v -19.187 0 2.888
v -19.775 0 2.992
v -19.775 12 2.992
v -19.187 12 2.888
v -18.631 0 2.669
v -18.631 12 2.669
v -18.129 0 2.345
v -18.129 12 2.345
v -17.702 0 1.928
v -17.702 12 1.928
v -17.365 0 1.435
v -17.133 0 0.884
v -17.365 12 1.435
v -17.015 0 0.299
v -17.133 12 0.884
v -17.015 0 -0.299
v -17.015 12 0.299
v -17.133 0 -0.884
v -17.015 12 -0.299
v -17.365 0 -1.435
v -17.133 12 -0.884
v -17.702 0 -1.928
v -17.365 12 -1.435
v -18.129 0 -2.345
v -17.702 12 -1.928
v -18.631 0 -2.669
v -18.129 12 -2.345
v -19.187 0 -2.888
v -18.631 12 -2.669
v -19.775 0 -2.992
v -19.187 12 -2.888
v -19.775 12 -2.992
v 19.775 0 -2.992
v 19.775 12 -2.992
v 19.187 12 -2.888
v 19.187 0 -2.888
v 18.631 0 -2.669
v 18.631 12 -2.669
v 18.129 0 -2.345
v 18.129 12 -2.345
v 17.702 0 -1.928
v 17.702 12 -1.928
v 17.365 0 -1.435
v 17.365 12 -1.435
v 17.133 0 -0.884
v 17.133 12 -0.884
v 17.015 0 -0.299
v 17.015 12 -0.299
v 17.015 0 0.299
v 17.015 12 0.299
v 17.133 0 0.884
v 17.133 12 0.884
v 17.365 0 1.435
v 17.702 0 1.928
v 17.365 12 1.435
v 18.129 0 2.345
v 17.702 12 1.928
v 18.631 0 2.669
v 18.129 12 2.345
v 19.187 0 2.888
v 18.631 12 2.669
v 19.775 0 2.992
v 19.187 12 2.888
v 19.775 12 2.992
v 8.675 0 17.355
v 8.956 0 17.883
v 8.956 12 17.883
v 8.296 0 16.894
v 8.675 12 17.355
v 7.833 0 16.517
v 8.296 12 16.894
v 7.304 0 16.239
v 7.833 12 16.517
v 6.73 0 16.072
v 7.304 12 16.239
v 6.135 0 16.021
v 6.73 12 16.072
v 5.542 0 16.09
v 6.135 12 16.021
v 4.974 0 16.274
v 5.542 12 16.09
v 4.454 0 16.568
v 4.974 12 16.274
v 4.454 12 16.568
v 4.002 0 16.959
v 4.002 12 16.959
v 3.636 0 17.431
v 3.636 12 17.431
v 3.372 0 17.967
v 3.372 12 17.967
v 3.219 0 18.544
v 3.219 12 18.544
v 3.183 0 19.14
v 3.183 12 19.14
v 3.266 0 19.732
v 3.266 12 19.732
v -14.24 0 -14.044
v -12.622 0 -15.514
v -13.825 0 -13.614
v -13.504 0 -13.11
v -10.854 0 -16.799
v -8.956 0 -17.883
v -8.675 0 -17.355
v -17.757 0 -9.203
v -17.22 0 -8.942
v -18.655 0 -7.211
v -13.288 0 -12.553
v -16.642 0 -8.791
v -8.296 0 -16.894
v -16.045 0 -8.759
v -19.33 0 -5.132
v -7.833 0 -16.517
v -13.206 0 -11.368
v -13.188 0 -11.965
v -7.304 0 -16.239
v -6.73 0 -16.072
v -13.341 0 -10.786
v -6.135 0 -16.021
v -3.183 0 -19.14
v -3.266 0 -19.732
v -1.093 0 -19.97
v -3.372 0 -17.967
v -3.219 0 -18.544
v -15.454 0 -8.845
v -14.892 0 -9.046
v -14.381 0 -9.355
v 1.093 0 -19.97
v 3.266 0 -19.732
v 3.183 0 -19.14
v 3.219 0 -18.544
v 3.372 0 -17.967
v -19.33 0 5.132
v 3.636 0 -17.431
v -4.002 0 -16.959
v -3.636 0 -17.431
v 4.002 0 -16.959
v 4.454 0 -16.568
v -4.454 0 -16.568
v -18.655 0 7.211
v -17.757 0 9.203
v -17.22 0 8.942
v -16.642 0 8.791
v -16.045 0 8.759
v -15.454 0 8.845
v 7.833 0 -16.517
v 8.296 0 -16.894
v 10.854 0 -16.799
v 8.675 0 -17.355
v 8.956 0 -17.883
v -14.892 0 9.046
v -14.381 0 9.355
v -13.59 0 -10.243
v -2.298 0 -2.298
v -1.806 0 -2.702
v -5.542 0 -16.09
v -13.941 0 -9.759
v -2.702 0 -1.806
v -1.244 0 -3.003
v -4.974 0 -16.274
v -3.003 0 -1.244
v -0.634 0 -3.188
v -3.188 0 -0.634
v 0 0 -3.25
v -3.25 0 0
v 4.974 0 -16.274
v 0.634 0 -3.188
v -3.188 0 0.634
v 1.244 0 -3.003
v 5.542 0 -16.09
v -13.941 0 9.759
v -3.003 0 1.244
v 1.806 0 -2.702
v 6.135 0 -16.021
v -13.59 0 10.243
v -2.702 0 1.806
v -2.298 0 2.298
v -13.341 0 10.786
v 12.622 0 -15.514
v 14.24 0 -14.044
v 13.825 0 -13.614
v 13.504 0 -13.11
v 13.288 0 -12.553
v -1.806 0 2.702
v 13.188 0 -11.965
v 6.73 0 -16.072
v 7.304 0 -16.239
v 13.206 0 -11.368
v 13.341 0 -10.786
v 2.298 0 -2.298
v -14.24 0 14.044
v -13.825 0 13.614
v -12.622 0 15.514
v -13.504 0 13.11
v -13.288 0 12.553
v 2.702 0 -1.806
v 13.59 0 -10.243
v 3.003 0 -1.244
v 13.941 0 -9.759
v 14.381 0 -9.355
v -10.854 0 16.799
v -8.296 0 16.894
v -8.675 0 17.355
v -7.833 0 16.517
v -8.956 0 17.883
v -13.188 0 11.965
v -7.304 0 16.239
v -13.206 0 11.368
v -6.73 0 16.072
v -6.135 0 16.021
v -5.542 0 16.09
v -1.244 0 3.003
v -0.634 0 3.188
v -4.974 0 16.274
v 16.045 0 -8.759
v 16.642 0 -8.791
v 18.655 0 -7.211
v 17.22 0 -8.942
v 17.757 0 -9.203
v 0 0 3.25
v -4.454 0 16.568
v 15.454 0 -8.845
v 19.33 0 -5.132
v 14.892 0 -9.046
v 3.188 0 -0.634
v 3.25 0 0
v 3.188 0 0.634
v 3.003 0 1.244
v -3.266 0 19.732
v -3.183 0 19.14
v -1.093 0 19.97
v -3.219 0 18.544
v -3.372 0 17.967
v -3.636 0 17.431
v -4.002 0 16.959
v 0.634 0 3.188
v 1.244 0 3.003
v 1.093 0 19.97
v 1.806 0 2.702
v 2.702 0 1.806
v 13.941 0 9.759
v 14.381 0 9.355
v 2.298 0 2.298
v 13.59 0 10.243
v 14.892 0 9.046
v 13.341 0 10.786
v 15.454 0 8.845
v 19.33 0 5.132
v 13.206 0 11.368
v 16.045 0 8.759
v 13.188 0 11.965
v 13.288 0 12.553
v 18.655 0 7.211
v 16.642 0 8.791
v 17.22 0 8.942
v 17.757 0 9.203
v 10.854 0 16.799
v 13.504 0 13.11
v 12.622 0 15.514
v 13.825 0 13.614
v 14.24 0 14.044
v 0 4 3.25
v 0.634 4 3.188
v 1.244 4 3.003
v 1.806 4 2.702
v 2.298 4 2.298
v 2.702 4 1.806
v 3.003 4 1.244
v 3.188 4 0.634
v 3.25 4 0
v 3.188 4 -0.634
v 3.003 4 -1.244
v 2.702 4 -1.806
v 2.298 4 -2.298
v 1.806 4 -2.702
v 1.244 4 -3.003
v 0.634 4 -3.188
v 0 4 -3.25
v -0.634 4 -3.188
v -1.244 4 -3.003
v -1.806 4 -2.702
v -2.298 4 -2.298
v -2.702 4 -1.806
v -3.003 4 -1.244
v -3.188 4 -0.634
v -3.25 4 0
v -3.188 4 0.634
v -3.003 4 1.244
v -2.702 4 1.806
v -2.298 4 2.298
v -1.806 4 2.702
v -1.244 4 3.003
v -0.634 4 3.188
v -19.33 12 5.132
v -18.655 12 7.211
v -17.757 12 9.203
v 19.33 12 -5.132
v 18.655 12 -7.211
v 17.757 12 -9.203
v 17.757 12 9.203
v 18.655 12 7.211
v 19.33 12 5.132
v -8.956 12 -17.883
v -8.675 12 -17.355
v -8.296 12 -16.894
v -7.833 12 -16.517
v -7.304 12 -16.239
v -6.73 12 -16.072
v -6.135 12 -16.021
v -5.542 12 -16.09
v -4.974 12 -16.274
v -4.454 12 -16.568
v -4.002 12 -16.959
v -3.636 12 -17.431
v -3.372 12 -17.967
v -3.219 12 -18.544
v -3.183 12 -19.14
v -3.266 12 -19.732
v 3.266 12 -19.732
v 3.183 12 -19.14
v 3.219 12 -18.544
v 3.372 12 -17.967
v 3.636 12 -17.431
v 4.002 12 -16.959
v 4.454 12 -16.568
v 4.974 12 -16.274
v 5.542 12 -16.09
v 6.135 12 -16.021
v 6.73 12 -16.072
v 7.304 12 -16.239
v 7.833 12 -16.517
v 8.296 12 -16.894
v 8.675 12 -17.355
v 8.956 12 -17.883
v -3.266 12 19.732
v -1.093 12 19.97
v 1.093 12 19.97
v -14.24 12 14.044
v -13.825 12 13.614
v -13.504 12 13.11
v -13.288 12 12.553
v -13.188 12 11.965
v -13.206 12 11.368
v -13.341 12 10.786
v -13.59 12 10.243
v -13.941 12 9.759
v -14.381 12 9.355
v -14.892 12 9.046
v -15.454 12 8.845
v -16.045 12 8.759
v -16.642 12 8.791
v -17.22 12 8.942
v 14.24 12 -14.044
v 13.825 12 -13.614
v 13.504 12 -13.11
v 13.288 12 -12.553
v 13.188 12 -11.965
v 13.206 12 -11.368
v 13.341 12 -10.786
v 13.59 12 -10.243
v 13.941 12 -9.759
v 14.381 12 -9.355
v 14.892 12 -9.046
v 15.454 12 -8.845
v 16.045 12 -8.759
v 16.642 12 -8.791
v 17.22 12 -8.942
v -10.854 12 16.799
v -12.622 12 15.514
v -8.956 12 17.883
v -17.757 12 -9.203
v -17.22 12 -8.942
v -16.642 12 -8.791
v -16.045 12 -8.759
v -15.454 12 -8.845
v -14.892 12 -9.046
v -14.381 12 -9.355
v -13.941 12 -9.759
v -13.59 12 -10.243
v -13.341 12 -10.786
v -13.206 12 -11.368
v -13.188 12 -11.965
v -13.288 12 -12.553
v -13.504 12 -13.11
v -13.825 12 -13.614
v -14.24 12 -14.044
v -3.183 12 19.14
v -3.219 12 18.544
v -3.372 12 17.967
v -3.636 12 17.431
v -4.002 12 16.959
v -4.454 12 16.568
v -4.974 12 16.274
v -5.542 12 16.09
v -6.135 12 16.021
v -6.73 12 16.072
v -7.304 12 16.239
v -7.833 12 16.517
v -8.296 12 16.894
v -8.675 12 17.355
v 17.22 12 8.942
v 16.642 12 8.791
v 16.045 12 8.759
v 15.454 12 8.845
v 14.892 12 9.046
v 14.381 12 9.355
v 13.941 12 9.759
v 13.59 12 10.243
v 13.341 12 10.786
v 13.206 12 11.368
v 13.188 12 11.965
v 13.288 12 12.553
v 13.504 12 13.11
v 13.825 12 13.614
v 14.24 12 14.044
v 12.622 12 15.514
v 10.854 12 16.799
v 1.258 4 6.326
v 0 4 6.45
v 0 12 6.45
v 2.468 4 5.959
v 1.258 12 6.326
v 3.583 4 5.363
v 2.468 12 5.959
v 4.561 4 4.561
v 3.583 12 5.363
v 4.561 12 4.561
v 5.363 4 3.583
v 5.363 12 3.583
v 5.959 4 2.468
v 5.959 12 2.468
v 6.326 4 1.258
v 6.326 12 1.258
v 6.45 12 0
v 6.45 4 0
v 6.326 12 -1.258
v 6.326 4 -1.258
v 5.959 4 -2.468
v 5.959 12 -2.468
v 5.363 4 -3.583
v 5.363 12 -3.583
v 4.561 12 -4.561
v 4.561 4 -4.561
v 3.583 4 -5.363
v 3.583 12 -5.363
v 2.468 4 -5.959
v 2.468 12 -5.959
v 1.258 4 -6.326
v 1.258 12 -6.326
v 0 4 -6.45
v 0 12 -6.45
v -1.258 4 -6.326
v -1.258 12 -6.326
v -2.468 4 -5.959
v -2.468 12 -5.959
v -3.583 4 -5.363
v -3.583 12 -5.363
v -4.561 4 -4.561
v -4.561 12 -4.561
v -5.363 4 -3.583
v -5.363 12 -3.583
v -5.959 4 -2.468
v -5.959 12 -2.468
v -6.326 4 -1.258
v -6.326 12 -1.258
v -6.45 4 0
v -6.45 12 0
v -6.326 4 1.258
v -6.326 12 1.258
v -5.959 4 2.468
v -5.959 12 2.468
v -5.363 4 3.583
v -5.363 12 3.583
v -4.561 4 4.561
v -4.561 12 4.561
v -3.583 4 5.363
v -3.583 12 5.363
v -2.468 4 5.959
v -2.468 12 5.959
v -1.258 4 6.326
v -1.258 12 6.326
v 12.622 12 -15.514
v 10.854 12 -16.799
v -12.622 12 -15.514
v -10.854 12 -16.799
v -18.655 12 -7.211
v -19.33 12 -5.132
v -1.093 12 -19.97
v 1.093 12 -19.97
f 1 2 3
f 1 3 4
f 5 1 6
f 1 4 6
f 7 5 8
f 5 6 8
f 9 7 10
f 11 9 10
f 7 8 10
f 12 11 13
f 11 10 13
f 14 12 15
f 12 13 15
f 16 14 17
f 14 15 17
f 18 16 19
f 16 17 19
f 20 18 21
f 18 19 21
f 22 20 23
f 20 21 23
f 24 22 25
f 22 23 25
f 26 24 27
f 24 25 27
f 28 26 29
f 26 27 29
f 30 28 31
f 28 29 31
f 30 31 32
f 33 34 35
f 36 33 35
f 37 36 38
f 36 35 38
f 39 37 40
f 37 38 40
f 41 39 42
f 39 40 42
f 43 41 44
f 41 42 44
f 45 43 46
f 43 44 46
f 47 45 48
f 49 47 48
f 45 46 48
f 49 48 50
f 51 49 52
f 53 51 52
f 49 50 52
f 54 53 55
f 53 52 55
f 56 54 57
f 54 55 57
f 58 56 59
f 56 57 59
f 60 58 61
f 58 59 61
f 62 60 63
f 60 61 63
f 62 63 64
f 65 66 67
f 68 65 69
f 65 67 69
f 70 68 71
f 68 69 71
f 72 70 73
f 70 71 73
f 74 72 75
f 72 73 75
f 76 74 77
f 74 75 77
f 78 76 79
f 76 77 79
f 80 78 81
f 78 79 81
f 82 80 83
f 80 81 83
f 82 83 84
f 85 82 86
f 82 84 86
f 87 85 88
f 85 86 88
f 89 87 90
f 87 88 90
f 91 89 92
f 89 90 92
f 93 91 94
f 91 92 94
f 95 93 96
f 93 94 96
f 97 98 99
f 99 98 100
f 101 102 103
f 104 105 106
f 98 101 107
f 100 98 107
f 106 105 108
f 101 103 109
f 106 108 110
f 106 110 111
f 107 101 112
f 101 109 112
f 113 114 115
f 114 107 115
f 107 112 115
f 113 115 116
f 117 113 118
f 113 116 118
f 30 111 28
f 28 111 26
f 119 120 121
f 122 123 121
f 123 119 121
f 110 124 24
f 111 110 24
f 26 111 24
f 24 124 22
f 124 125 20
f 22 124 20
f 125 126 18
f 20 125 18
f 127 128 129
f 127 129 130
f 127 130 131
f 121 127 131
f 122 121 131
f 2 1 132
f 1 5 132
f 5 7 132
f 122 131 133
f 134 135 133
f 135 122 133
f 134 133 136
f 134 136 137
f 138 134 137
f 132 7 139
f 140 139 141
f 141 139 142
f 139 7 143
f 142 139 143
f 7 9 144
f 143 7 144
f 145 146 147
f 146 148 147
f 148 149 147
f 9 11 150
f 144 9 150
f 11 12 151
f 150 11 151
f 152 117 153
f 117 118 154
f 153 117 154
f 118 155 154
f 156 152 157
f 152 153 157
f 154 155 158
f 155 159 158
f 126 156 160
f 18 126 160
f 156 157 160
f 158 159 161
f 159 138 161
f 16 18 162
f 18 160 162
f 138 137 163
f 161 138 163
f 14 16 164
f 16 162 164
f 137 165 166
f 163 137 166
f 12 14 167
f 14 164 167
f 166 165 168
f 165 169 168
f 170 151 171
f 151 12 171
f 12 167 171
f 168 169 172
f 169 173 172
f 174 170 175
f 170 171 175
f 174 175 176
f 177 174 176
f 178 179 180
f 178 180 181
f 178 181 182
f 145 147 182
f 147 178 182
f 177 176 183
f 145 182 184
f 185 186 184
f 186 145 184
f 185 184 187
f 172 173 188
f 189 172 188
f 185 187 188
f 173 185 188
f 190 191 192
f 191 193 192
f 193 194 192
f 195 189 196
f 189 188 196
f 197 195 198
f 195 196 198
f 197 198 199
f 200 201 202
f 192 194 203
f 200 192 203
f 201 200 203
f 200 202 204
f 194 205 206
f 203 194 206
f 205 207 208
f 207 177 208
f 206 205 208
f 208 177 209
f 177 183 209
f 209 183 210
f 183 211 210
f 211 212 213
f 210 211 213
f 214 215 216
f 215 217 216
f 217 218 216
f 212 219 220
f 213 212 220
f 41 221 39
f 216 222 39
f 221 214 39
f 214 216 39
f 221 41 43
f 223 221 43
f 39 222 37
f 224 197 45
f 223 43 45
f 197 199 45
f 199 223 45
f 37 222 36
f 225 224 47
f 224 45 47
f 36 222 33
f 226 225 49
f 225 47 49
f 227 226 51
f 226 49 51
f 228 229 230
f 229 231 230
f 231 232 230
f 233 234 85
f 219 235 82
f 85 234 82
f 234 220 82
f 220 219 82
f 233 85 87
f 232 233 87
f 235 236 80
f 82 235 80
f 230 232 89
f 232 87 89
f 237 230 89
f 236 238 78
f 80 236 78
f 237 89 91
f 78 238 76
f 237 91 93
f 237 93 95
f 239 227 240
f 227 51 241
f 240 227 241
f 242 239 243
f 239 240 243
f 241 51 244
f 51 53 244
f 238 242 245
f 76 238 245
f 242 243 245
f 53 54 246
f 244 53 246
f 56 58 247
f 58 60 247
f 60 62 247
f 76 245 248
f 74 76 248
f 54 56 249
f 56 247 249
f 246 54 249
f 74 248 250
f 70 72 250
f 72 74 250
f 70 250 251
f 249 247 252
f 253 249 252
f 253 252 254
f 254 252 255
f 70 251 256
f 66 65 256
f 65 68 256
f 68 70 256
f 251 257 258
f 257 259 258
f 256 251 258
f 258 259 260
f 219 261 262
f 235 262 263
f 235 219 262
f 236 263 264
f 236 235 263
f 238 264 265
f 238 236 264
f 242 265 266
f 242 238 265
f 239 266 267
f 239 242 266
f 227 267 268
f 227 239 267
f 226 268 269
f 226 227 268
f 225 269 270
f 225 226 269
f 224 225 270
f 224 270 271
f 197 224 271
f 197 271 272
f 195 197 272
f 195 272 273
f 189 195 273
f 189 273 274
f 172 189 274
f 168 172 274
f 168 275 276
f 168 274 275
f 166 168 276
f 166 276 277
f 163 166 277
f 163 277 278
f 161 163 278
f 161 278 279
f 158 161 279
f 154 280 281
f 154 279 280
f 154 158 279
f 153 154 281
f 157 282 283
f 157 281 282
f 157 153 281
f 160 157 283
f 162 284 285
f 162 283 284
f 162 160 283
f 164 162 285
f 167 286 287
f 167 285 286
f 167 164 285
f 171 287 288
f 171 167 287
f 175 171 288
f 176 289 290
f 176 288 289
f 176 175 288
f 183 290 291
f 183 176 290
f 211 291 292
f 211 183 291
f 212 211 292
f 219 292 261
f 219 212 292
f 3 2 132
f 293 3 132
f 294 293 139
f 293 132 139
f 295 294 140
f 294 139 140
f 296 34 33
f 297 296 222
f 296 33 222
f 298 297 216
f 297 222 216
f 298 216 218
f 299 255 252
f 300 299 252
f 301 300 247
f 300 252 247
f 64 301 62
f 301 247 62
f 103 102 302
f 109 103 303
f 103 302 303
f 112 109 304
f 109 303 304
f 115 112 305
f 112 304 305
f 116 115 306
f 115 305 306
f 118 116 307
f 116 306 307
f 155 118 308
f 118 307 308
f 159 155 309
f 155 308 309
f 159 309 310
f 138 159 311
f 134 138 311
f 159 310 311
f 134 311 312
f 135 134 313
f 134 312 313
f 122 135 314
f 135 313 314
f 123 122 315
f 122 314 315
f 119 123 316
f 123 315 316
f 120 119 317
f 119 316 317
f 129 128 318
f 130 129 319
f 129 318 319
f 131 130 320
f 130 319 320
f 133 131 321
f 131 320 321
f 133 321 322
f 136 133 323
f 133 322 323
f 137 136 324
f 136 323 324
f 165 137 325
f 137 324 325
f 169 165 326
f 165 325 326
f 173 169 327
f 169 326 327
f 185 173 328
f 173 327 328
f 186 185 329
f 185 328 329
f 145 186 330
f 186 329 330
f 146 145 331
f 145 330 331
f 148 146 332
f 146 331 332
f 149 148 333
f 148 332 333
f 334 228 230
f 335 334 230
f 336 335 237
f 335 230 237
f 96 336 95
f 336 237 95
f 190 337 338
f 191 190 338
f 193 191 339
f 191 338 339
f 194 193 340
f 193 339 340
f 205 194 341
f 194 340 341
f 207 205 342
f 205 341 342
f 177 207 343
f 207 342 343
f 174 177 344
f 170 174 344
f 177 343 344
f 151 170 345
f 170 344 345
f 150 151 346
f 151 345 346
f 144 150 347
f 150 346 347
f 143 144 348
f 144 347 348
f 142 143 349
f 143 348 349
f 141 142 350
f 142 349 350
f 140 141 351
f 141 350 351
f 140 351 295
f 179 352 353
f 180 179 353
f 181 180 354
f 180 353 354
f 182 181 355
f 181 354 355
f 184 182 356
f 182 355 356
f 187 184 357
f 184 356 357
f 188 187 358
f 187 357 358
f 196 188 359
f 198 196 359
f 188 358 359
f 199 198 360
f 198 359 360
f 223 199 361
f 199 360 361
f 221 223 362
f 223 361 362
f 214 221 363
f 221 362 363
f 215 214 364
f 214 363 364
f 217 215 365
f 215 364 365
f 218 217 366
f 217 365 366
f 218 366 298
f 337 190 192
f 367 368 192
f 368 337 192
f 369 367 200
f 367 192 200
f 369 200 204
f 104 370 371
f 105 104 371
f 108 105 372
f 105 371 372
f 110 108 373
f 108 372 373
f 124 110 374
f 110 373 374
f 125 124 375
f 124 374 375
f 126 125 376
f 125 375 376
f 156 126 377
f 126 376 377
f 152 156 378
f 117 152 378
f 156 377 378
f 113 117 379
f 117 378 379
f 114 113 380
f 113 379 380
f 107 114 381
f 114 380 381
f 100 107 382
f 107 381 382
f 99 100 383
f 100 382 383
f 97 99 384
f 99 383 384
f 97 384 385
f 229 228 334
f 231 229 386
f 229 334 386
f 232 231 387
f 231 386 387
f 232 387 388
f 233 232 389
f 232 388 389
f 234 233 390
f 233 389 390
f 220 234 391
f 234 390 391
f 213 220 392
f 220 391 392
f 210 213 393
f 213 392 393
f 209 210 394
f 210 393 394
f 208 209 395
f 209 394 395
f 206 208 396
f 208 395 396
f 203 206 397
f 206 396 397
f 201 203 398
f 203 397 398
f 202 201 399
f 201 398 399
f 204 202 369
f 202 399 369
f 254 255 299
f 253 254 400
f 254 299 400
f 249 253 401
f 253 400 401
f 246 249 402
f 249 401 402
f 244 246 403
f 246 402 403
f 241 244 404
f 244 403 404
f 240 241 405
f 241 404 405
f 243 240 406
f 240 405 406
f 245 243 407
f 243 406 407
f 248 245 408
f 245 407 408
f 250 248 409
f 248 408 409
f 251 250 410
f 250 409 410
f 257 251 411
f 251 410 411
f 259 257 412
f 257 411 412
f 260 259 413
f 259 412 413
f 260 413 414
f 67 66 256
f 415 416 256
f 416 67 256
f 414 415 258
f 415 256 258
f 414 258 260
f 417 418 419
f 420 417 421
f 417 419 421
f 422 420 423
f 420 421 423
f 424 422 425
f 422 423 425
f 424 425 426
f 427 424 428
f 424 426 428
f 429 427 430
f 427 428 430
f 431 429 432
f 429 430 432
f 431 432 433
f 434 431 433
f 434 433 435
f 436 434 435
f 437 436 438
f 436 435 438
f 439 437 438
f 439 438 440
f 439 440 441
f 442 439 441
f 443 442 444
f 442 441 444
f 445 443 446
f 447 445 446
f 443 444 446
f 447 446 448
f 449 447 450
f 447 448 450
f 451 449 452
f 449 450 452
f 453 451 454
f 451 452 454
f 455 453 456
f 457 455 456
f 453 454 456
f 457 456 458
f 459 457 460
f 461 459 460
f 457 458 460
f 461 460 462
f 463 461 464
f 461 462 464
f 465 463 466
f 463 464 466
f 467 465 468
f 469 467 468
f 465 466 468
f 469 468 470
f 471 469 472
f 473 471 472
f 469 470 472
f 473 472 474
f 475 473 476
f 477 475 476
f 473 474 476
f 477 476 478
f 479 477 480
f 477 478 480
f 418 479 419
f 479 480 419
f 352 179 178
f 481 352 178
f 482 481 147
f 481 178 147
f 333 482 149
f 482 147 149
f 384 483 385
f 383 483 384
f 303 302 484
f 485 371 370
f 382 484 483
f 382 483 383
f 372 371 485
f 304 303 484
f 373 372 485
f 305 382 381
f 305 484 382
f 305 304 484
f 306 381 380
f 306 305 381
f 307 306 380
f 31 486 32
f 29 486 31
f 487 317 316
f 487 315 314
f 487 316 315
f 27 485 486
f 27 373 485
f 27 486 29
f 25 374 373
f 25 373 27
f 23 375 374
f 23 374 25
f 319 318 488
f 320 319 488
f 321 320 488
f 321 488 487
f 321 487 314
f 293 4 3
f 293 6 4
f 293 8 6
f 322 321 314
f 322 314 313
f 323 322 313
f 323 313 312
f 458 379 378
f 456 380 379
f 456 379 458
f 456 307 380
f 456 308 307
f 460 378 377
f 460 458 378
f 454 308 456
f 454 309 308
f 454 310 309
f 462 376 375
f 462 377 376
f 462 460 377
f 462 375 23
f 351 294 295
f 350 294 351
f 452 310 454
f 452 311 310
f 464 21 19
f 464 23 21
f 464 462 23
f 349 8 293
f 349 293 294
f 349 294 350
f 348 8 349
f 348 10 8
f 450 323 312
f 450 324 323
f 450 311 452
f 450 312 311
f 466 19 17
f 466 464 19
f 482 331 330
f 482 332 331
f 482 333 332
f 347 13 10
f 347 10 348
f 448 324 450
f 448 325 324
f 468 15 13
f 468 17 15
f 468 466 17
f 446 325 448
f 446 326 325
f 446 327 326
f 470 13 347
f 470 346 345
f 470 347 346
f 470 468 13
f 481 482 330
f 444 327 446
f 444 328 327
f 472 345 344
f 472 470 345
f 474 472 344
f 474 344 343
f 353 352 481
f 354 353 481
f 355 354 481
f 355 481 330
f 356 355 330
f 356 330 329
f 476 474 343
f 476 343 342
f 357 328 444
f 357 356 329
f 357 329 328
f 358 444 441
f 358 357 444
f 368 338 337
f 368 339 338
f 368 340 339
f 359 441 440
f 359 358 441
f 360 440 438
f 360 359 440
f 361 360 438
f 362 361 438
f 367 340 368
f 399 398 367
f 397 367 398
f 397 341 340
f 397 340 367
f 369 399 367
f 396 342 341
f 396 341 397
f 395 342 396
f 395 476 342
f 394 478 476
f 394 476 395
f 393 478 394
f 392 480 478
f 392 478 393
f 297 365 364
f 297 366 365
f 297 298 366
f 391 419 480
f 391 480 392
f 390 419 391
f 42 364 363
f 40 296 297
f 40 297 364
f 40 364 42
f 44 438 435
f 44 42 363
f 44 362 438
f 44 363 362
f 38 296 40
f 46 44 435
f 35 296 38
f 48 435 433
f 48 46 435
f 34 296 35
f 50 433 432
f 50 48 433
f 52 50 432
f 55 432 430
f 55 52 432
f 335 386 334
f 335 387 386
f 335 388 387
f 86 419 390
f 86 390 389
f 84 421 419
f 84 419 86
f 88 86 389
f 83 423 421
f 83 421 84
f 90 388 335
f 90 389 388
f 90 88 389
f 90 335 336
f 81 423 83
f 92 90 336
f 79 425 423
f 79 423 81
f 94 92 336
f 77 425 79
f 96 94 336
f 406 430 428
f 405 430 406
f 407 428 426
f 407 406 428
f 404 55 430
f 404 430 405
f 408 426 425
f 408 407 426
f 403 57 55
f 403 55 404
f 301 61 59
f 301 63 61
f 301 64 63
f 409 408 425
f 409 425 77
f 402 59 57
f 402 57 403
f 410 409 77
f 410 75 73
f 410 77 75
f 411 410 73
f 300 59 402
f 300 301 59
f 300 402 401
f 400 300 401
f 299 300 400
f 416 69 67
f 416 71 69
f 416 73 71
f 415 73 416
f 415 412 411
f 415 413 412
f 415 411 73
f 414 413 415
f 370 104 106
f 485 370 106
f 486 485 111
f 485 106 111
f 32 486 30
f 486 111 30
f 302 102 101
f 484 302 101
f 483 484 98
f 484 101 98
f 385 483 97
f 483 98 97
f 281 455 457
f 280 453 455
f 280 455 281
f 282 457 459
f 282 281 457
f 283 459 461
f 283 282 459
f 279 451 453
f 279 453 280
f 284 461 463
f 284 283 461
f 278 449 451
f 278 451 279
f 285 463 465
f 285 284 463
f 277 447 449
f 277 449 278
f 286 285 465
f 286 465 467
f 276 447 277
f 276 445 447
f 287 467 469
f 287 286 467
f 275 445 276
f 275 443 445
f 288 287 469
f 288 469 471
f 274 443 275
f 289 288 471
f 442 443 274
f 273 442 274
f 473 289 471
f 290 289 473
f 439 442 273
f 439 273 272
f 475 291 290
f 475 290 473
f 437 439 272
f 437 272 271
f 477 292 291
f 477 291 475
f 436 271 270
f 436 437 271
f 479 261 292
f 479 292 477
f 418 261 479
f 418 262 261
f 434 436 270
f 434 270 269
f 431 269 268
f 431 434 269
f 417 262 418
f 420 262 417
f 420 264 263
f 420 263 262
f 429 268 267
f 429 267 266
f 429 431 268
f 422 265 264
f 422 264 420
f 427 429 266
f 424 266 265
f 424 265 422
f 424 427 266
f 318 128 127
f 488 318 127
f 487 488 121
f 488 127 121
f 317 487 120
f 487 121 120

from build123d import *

# Parameters (mm, degrees)
SKETCH1_R           = 20
SKETCH1_R_2         = 3.25
BOSS_EXTRUDE1_DEPTH = 12
SKETCH2_R           = 6.45
CUT_EXTRUDE1_DEPTH  = 8
SKETCH3_R           = 3
CUT_EXTRUDE2_DEPTH  = 31.724582991
CIRPATTERN1_COUNT   = 10


with BuildPart() as part:
    # Sketch1 → Boss-Extrude1 (new body)
    with BuildSketch(Plane(origin=(0, 0, 0), x_dir=(1, 0, 0), z_dir=(0, 1, 0))):
        with Locations(Location((0, 0, 0), (0, 0, 270))):
            Circle(SKETCH1_R)
        with Locations(Location((0, 0, 0), (0, 0, 270))):
            Circle(SKETCH1_R_2, mode=Mode.SUBTRACT)
    extrude(amount=BOSS_EXTRUDE1_DEPTH)

    # Sketch2 → Cut-Extrude1 (cut)
    with BuildSketch(Plane(origin=(0, 12, 0), x_dir=(1, 0, 0), z_dir=(0, 1, 0))):
        with Locations(Location((0, 0, 0), (0, 0, 270))):
            Circle(SKETCH2_R)
    extrude(amount=-CUT_EXTRUDE1_DEPTH, mode=Mode.SUBTRACT)

    # Sketch3 → Cut-Extrude2 (cut, through all)
    with BuildSketch(Plane(origin=(0, 12, 0), x_dir=(1, 0, 0), z_dir=(0, 1, 0))):
        with Locations((20, 0)):
            Circle(SKETCH3_R)
    cut_extrude2 = extrude(amount=-CUT_EXTRUDE2_DEPTH, mode=Mode.SUBTRACT)

    # CirPattern1: Cut-Extrude2 ×10 about axis
    cirpattern1_axis = Axis((0, 0, 0), (0, 1, 0))
    for i in range(1, CIRPATTERN1_COUNT):
        add(cut_extrude2.rotate(cirpattern1_axis, i * 360 / CIRPATTERN1_COUNT), mode=Mode.SUBTRACT)


solid = part.part
